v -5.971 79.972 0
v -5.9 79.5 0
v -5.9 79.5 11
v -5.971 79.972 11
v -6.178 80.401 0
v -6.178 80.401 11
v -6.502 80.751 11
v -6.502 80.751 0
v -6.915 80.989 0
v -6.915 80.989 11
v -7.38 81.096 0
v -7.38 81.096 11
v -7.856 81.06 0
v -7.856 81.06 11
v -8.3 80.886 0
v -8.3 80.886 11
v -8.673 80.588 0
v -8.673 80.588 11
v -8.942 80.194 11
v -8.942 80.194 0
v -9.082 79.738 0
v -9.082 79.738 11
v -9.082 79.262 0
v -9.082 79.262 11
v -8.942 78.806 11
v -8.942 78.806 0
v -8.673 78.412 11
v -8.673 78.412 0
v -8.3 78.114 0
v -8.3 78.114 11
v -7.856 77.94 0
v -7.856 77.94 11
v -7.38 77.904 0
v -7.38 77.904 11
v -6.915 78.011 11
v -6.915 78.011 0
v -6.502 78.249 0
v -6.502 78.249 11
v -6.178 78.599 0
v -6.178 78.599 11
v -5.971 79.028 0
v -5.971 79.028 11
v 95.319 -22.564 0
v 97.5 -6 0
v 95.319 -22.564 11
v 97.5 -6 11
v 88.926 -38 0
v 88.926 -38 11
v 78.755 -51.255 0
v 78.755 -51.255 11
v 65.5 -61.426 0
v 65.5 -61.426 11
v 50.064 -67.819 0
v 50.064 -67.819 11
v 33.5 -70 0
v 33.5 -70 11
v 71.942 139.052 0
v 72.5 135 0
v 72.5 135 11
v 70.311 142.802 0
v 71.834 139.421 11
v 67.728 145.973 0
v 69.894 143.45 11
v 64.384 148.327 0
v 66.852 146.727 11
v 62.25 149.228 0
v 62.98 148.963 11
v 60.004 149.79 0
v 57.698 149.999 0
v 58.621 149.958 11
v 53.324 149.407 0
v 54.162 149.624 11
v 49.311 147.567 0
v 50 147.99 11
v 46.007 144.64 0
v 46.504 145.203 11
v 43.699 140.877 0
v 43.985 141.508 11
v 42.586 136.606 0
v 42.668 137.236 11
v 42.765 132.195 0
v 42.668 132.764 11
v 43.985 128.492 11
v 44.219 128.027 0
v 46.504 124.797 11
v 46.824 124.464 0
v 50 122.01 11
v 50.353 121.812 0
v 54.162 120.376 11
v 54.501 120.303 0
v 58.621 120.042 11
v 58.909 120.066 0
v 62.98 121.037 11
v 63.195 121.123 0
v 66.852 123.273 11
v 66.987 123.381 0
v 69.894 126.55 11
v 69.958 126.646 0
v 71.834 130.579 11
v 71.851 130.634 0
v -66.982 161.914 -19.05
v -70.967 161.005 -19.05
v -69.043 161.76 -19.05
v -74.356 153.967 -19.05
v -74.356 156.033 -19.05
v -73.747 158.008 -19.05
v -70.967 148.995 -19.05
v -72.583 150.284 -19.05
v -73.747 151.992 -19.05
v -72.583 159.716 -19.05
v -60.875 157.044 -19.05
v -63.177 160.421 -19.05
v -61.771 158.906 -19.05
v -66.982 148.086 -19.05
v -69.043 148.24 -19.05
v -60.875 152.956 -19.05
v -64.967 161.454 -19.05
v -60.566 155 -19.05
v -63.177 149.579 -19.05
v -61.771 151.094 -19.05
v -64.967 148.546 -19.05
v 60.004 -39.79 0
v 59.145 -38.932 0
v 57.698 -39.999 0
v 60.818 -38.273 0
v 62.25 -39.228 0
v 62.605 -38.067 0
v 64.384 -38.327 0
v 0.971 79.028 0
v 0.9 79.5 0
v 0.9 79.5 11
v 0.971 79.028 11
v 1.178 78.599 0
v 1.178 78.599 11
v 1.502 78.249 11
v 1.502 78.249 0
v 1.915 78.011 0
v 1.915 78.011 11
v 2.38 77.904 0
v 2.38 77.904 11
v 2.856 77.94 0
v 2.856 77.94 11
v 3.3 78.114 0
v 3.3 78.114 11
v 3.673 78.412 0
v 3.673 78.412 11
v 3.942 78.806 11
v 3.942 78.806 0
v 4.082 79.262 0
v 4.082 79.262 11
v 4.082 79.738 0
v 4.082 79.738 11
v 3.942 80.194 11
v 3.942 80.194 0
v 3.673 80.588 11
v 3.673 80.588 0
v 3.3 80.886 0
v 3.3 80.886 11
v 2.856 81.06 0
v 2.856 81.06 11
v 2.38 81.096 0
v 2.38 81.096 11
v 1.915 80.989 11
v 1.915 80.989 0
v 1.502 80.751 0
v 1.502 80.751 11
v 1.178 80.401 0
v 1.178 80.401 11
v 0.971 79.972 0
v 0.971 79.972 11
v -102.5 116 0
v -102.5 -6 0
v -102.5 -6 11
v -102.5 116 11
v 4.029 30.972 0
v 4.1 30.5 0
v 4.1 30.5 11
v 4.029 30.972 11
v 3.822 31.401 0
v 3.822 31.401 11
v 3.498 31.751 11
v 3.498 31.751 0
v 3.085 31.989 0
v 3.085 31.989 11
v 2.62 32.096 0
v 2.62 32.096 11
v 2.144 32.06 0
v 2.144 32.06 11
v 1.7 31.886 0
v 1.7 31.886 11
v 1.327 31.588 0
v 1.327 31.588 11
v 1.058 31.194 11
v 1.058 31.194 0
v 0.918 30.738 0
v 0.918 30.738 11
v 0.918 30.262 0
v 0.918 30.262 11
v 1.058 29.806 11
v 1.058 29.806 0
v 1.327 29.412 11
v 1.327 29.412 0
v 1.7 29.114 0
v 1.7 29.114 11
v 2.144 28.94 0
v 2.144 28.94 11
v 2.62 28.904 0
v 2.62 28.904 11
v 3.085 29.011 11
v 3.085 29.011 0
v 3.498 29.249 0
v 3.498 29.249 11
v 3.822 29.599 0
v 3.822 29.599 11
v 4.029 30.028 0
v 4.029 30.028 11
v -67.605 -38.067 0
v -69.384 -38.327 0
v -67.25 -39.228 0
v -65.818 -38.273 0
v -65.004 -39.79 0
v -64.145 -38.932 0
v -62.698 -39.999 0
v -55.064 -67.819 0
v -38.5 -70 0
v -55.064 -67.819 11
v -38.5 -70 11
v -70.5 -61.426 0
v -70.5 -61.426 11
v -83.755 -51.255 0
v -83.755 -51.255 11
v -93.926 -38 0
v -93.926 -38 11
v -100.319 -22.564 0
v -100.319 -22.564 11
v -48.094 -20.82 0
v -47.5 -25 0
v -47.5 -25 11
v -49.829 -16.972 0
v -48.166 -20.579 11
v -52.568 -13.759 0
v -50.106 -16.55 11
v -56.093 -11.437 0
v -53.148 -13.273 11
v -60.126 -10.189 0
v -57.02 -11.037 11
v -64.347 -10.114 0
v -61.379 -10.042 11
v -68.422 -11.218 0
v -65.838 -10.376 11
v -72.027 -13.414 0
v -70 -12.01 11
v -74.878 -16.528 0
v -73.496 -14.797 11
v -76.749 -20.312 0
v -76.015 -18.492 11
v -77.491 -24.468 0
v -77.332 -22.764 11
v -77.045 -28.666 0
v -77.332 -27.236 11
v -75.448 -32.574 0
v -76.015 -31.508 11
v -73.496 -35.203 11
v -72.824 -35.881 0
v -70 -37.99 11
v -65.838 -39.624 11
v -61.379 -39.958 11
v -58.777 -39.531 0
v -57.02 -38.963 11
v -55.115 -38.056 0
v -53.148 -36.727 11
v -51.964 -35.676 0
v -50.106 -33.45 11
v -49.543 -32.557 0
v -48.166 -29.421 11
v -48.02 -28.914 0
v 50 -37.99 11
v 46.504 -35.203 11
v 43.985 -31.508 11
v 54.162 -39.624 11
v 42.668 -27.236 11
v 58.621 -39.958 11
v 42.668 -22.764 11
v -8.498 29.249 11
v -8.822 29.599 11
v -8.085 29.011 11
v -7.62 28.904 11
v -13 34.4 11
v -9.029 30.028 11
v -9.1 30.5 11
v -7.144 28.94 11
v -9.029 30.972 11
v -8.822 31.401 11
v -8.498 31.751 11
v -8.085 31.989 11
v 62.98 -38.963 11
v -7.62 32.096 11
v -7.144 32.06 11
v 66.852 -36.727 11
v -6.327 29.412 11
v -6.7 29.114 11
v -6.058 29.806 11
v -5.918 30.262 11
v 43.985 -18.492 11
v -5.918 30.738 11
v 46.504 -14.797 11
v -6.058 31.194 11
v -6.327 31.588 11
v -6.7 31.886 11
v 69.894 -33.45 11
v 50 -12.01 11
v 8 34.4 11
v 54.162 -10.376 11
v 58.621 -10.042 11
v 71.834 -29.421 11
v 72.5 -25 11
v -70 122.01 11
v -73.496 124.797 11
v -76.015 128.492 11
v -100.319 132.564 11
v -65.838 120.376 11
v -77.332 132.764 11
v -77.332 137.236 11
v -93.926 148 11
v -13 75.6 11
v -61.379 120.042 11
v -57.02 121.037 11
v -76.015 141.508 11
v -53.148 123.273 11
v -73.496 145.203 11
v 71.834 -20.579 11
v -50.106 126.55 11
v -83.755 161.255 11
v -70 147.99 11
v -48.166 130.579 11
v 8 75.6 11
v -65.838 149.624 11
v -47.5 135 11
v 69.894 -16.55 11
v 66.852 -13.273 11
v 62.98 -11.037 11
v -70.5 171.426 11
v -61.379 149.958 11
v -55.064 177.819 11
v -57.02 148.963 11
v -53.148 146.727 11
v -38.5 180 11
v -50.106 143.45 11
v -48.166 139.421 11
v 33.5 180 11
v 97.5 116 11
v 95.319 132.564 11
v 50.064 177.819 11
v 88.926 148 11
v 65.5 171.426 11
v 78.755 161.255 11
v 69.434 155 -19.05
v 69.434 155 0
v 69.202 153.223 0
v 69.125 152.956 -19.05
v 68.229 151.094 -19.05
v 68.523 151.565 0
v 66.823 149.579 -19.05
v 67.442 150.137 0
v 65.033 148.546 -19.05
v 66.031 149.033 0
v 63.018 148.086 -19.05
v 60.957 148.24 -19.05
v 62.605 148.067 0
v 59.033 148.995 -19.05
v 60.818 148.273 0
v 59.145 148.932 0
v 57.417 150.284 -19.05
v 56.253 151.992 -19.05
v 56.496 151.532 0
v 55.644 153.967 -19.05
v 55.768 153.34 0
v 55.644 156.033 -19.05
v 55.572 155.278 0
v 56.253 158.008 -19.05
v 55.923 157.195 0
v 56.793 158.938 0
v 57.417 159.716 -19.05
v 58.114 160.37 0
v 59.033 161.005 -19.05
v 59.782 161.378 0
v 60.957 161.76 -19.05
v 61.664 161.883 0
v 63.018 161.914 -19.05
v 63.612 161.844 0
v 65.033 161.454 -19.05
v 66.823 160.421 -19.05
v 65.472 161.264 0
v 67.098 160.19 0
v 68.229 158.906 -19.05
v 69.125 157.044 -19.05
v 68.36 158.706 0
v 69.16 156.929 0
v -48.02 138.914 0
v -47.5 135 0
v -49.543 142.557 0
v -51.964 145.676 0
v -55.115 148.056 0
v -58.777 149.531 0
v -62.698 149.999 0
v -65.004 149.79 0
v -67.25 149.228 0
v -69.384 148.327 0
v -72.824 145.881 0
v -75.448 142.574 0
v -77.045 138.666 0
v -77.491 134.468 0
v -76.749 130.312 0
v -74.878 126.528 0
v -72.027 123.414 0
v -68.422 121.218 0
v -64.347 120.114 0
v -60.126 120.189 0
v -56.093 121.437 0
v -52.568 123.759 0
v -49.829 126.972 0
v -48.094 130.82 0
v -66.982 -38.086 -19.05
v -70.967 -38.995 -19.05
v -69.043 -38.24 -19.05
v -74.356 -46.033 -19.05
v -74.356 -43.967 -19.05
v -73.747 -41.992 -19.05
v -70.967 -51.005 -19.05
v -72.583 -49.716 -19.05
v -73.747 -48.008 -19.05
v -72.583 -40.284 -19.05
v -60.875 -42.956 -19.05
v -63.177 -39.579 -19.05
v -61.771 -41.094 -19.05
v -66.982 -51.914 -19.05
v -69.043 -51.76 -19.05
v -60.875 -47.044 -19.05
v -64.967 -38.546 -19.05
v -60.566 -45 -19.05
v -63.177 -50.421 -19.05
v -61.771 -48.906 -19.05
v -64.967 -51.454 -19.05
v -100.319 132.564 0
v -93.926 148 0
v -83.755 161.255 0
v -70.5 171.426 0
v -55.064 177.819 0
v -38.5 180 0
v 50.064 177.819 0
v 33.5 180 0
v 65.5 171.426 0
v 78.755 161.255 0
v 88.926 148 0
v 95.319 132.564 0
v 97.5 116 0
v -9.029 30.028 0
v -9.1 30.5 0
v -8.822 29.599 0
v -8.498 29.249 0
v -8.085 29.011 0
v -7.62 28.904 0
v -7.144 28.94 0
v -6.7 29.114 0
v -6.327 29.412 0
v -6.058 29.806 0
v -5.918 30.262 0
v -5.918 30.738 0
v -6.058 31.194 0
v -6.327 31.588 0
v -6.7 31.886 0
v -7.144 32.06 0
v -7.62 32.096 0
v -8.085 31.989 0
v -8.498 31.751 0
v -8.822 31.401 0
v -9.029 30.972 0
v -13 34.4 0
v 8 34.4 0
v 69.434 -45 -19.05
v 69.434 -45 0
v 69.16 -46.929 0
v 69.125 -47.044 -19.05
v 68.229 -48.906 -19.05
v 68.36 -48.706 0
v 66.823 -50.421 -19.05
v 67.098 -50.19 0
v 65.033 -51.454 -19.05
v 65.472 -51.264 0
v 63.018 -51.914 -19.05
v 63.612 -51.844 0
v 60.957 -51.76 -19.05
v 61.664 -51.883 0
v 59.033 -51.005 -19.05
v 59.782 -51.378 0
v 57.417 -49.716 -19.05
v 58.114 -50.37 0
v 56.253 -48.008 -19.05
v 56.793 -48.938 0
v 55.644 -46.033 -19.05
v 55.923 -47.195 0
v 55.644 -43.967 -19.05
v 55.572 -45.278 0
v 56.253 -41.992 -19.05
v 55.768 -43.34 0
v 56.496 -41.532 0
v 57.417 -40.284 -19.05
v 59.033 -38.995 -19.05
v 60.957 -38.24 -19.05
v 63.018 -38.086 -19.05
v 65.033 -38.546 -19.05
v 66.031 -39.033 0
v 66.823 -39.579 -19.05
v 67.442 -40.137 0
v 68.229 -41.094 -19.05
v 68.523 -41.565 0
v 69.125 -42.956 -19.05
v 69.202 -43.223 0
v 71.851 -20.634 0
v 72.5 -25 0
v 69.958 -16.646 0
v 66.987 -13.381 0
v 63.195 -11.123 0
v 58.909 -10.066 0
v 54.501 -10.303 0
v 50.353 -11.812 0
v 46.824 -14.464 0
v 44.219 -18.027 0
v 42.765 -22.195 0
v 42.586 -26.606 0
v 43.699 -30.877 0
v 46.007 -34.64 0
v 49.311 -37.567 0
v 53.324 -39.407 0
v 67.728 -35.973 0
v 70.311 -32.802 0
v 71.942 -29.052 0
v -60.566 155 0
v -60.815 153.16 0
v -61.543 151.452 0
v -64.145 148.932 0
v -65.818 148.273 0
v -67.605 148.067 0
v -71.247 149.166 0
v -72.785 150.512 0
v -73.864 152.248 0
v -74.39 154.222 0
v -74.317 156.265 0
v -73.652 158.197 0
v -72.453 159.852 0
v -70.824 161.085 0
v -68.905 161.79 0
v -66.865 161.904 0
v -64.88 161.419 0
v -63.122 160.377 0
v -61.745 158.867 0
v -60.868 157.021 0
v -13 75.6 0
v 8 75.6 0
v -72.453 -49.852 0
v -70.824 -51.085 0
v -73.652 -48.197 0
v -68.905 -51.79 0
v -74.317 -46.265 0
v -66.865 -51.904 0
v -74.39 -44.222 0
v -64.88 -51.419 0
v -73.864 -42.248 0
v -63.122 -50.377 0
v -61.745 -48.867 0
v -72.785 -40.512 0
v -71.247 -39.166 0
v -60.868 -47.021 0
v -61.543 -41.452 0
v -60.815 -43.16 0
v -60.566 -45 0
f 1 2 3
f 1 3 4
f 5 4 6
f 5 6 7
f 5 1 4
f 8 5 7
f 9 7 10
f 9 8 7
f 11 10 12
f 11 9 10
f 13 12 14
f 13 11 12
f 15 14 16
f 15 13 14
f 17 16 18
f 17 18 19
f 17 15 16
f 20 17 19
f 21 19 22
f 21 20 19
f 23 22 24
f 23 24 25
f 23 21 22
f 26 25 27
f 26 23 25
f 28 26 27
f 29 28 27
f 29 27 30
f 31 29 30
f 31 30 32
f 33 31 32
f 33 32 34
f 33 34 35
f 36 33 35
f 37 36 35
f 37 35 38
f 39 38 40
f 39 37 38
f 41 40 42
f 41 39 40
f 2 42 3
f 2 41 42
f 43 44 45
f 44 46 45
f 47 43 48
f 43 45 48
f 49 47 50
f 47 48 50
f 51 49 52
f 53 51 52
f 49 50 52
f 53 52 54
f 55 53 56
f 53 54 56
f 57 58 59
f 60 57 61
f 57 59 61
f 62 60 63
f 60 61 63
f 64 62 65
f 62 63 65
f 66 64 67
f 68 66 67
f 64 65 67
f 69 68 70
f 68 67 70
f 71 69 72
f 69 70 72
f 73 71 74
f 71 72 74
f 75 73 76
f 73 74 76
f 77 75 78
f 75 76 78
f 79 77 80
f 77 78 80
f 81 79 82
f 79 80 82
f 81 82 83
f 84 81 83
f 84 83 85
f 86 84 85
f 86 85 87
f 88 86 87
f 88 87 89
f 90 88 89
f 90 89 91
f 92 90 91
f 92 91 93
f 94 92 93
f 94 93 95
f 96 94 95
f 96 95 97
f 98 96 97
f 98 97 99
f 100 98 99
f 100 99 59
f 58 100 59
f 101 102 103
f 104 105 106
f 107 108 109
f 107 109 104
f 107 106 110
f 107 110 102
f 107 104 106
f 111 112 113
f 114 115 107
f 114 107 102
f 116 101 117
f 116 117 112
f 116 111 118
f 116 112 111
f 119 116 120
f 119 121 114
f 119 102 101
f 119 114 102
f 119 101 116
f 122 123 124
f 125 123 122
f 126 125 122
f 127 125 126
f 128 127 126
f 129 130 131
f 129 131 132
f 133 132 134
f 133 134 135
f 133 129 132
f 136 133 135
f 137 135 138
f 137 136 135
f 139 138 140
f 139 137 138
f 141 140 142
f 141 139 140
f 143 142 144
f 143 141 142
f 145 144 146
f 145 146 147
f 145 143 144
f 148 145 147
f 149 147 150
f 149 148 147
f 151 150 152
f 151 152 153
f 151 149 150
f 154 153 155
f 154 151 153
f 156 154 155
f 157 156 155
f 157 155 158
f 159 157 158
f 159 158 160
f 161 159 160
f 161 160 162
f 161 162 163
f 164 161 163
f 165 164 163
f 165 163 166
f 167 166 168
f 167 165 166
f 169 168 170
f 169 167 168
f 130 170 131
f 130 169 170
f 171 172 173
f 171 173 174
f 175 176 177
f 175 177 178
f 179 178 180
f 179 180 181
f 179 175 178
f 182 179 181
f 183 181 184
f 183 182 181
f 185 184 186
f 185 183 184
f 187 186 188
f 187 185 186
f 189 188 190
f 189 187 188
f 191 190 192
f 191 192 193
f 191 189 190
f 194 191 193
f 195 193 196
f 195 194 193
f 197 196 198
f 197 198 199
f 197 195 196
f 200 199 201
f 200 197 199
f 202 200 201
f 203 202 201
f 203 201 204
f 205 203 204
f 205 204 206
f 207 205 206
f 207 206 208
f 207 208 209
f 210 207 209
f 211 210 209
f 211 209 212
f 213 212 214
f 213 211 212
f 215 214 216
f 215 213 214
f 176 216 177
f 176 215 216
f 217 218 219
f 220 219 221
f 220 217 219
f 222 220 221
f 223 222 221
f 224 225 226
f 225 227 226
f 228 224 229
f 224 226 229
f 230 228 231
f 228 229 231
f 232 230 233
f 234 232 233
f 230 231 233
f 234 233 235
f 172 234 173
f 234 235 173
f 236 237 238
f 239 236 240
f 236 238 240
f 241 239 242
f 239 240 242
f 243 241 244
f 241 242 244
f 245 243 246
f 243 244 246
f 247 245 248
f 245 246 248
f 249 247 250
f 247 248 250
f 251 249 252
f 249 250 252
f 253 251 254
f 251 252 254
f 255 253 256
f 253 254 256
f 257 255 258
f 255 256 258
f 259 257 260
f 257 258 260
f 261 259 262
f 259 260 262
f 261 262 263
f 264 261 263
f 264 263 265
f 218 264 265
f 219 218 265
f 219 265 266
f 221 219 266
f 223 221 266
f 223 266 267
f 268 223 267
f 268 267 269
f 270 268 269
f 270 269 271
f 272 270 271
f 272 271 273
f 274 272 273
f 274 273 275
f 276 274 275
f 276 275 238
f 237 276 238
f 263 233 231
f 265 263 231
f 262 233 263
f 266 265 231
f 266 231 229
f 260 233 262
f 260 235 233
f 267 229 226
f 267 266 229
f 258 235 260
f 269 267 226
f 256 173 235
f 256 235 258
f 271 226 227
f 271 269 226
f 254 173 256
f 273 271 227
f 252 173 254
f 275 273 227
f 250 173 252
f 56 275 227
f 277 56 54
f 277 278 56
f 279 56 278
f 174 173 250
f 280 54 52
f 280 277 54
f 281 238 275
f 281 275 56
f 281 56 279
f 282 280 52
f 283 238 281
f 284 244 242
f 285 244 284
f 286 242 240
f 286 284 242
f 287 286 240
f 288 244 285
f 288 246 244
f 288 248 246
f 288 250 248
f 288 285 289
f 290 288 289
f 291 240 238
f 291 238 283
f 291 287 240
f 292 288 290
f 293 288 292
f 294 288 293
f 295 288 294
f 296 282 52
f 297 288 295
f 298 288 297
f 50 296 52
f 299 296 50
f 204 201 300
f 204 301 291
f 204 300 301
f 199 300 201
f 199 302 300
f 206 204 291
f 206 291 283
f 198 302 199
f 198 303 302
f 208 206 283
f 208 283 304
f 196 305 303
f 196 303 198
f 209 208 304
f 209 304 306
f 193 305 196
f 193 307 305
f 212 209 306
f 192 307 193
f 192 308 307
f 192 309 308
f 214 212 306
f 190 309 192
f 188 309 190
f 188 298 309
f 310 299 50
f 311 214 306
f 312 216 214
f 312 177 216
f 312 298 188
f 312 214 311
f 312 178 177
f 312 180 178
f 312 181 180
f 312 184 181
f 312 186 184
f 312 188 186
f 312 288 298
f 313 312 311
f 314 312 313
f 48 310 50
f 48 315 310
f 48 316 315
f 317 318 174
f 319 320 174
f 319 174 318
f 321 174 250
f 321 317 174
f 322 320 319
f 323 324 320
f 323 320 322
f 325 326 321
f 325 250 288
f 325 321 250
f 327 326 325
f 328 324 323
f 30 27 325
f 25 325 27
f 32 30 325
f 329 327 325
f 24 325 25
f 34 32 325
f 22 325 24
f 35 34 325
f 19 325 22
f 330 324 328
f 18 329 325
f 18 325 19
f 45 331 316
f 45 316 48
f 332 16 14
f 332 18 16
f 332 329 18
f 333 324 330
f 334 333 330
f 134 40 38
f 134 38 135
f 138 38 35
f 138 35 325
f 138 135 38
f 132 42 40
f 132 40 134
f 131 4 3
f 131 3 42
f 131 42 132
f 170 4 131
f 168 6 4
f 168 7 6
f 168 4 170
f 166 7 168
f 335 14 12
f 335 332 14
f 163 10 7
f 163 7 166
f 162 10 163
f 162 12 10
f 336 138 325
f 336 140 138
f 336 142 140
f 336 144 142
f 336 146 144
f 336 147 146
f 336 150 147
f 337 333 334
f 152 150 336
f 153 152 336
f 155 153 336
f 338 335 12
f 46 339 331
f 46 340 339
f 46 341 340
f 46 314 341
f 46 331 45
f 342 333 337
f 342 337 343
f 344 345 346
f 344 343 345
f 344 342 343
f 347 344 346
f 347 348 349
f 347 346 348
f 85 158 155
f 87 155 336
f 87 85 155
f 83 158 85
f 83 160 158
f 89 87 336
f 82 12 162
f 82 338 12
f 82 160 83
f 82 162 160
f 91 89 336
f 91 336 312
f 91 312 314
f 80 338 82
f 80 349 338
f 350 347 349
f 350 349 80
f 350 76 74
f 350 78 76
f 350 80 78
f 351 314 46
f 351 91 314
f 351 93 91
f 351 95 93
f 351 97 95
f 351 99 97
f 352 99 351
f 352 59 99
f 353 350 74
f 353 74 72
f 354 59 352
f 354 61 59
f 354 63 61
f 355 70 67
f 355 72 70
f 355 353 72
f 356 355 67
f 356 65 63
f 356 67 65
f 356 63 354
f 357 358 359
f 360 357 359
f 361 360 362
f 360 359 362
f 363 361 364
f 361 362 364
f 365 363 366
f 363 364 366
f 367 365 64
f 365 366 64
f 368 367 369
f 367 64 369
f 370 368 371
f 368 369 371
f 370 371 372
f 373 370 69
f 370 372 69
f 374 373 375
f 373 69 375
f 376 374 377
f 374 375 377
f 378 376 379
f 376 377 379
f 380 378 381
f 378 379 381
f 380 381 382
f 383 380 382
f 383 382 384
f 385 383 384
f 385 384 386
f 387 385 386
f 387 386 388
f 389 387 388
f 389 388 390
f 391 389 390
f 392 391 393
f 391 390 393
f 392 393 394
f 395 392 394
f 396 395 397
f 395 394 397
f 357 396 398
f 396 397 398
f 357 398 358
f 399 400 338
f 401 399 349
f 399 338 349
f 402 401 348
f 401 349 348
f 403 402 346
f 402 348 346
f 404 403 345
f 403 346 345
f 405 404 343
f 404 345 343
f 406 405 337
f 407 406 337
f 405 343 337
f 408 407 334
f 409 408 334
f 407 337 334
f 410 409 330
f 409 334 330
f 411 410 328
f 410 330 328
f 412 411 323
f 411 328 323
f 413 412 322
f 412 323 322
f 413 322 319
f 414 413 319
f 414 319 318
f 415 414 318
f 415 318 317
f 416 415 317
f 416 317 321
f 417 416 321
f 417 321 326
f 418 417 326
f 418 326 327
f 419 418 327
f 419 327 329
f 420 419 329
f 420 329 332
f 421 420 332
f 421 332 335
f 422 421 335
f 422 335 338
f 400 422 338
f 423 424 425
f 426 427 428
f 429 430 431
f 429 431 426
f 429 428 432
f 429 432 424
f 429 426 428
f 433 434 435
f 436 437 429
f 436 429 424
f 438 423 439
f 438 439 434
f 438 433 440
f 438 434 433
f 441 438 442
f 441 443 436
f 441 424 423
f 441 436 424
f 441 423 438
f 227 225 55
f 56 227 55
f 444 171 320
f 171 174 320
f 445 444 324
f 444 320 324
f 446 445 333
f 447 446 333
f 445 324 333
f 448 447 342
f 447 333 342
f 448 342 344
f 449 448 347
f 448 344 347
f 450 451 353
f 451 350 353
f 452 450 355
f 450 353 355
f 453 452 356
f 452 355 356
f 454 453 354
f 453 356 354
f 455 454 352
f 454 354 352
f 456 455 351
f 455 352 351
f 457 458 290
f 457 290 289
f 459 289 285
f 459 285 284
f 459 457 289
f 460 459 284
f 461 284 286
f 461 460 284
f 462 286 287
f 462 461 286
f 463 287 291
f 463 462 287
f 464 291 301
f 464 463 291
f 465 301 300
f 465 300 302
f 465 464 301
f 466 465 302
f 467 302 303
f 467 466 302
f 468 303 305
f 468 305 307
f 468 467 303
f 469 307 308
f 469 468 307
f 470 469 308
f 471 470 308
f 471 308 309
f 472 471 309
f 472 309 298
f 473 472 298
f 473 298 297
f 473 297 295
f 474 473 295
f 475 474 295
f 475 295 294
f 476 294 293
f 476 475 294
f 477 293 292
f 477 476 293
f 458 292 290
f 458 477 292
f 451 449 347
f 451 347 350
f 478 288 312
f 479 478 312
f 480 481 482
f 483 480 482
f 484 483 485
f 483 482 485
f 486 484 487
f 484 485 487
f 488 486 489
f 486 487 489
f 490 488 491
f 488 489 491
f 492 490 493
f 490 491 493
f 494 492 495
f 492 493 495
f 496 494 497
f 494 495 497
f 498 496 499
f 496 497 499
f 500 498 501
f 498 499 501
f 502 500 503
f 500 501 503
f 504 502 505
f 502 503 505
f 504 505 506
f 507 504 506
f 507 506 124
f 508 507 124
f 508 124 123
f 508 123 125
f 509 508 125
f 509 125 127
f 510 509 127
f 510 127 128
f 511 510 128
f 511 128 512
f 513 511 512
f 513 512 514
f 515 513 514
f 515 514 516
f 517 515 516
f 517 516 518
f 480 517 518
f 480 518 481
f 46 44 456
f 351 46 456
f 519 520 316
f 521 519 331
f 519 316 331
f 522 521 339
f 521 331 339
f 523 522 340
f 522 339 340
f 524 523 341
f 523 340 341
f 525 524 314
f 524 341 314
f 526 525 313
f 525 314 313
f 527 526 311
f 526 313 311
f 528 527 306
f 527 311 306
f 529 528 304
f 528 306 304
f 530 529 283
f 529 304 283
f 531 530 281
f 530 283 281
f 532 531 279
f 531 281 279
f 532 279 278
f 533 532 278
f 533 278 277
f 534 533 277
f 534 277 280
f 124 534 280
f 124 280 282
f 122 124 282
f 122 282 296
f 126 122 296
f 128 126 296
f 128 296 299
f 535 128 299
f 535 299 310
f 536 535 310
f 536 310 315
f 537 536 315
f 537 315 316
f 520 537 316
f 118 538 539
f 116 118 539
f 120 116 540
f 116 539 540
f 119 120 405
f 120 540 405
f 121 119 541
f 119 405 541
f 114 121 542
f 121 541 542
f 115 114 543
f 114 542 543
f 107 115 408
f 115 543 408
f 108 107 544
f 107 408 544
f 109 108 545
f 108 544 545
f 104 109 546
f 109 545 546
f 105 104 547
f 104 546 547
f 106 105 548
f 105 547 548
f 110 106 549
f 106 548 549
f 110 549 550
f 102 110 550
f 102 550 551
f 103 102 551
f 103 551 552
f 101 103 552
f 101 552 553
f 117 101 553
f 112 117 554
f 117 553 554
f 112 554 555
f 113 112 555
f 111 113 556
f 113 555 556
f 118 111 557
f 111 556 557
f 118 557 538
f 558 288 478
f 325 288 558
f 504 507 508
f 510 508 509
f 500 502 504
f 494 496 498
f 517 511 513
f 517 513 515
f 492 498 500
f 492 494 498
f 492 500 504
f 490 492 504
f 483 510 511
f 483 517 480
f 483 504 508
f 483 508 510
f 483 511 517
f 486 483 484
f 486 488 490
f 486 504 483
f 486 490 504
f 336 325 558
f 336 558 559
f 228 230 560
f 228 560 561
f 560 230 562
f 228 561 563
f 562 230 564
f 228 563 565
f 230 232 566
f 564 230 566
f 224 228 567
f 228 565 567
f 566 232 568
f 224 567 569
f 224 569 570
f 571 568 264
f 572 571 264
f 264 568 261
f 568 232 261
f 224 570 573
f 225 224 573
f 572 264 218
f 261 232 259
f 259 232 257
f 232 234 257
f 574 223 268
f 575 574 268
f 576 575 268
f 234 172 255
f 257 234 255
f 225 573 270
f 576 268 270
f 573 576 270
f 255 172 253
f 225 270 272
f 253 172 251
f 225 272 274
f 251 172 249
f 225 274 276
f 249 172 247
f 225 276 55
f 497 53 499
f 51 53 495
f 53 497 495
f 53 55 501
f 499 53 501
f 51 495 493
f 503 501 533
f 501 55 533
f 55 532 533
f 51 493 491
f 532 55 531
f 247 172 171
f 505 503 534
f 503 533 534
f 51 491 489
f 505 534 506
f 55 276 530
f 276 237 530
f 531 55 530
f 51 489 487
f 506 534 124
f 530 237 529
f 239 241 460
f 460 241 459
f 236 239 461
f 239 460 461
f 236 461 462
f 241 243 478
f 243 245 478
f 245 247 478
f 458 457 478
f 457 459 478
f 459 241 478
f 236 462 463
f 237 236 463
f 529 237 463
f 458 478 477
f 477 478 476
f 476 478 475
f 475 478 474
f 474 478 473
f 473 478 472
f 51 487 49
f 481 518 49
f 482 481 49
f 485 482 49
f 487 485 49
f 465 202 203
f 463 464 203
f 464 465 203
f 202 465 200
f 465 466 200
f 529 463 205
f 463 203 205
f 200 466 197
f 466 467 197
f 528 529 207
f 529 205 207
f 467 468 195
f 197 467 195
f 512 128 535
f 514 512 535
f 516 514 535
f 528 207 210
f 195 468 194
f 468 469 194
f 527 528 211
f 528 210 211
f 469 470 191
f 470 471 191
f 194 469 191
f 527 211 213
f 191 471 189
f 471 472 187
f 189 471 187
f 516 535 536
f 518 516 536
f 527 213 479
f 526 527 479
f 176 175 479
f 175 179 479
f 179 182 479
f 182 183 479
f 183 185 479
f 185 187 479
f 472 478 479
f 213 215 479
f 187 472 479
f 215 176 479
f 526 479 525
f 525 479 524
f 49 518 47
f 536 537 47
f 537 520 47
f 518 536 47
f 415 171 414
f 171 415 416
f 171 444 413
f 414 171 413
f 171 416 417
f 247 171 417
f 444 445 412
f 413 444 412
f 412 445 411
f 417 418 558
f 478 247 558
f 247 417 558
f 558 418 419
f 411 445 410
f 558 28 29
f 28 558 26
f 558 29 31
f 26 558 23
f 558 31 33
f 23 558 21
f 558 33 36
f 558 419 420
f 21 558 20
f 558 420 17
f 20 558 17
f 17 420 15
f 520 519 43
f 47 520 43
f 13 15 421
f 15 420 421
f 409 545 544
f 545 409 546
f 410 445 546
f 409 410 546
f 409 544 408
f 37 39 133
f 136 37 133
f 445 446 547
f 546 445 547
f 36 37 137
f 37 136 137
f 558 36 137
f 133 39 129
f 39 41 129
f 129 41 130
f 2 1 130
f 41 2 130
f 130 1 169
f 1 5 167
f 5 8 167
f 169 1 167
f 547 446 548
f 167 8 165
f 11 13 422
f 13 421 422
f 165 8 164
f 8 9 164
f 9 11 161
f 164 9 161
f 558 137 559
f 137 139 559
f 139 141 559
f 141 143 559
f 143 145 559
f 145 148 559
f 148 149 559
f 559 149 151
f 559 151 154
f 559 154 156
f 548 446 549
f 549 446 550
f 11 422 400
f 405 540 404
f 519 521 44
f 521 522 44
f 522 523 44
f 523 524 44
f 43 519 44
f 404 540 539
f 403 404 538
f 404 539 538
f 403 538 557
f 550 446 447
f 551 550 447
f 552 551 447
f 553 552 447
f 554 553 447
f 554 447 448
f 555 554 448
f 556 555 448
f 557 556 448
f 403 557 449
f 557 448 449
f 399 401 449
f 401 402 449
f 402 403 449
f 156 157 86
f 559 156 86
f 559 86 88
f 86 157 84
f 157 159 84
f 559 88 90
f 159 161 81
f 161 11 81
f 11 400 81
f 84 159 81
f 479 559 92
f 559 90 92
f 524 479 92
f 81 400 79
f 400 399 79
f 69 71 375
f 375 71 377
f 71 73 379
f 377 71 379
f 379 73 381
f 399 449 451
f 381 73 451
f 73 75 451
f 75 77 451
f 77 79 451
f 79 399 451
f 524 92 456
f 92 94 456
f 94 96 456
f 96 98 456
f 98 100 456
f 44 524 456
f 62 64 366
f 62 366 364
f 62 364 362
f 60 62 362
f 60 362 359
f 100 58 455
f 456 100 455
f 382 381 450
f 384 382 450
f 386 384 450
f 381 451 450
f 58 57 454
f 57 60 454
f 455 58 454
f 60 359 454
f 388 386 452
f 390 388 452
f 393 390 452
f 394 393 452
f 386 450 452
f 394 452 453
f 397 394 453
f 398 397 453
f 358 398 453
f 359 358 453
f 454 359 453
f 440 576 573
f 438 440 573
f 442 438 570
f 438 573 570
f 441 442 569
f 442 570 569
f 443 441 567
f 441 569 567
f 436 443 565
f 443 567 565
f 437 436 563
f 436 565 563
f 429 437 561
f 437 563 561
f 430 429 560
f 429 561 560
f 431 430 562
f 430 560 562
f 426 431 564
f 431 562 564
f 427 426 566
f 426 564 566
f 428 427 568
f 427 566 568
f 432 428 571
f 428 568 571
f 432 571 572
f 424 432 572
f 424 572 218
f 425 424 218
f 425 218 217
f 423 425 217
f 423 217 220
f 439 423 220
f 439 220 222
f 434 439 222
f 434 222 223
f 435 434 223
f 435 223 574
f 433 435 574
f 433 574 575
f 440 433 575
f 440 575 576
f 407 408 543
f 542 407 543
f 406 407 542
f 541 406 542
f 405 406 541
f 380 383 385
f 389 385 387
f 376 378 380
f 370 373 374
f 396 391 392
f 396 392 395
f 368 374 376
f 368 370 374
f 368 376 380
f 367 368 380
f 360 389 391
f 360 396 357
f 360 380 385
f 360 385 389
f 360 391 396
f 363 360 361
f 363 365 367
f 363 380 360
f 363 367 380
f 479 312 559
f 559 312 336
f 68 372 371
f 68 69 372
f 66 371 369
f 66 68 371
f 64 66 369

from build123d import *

# Parameters (mm, degrees)
SKETCH1_R           = 1.6
SKETCH1_W           = 21
SKETCH1_H           = 41
BOSS_EXTRUDE1_DEPTH = 11
SKETCH6_W           = 21
SKETCH6_H           = 0.1
CUT_EXTRUDE1_DEPTH  = 91.428148273
SKETCH7_W           = 21
SKETCH7_H           = 41.2
SKETCH7_R           = 1.6
CUT_EXTRUDE2_DEPTH  = 11
BOSS_EXTRUDE2_START = -11
SKETCH8_W           = 200
SKETCH8_H           = 250
SKETCH8_W_2         = 21
SKETCH8_H_2         = 41.2
SKETCH8_R           = 1.6
BOSS_EXTRUDE2_DEPTH = 11
FILLET1_R           = 64
FILLET2_R           = 64
FILLET3_R           = 64
FILLET4_R           = 64
SKETCH12_R          = 6.933523759
BOSS_EXTRUDE3_DEPTH = 19.05
SKETCH13_R          = 15
CUT_EXTRUDE3_DEPTH  = 11


with BuildPart() as part:
    # Sketch1 → Boss-Extrude1 (new body)
    with BuildSketch(Plane.XY):
        with BuildLine():
            Line((-20, 70), (-20, -50))
            ThreePointArc((-20, -50), (-2.5, -67.5), (15, -50))
            Line((15, -50), (15, 70))
            ThreePointArc((15, 70), (-2.5, 87.5), (-20, 70))
        make_face()
        with Locations((-7.5, 79.5)):
            Circle(SKETCH1_R, mode=Mode.SUBTRACT)
        with Locations(Location((2.5, 79.5, 0), (0, 0, 180))):
            Circle(SKETCH1_R, mode=Mode.SUBTRACT)
        with Locations((2.5, 30.5)):
            Circle(SKETCH1_R, mode=Mode.SUBTRACT)
        with Locations(Location((-7.5, 30.5, 0), (0, 0, 180))):
            Circle(SKETCH1_R, mode=Mode.SUBTRACT)
        with Locations((-2.5, 55)):
            Rectangle(SKETCH1_W, SKETCH1_H, mode=Mode.SUBTRACT)
    extrude(amount=BOSS_EXTRUDE1_DEPTH)

    # Sketch6 → Cut-Extrude1 (cut, through all)
    with BuildSketch(Plane.XY.offset(11)):
        with Locations((-2.5, 75.55)):
            Rectangle(SKETCH6_W, SKETCH6_H)
        with Locations((-2.5, 34.45)):
            Rectangle(SKETCH6_W, SKETCH6_H)
    extrude(amount=-CUT_EXTRUDE1_DEPTH, mode=Mode.SUBTRACT)

    # Sketch7 → Cut-Extrude2 (cut)
    with BuildSketch(Plane(origin=(0, 0, 0), x_dir=(-1, 0, 0), z_dir=(0, 0, -1))):
        with Locations((2.5, -35)):
            Rectangle(SKETCH7_W, SKETCH7_H)
        with Locations((-2.5, -10.5)):
            Circle(SKETCH7_R)
        with Locations((7.5, -10.5)):
            Circle(SKETCH7_R)
        with Locations((-2.5, -59.5)):
            Circle(SKETCH7_R)
        with Locations((7.5, -59.5)):
            Circle(SKETCH7_R)
    extrude(amount=-CUT_EXTRUDE2_DEPTH, mode=Mode.SUBTRACT)

    # Sketch8 → Boss-Extrude2 (add)
    # profile 1 of 6: a face of its own
    with BuildSketch(Plane.XY.offset(11).offset(BOSS_EXTRUDE2_START)):
        with Locations((-2.5, 55)):
            Rectangle(SKETCH8_W, SKETCH8_H)
        with BuildLine():
            ThreePointArc((-20, -50), (-2.5, -67.5), (15, -50))
            Line((15, -50), (15, 70))
            ThreePointArc((15, 70), (-2.5, 87.5), (-20, 70))
            Line((-20, 70), (-20, -50))
        make_face(mode=Mode.SUBTRACT)
    # profile 2 of 6: a face of its own
    with BuildSketch(Plane.XY.offset(11).offset(BOSS_EXTRUDE2_START)):
        with Locations((-2.5, -35)):
            Rectangle(SKETCH8_W_2, SKETCH8_H_2)
    # profile 3 of 6: a face of its own
    with BuildSketch(Plane.XY.offset(11).offset(BOSS_EXTRUDE2_START)):
        with Locations((-7.5, -59.5)):
            Circle(SKETCH8_R)
    # profile 4 of 6: a face of its own
    with BuildSketch(Plane.XY.offset(11).offset(BOSS_EXTRUDE2_START)):
        with Locations((2.5, -59.5)):
            Circle(SKETCH8_R)
    # profile 5 of 6: a face of its own
    with BuildSketch(Plane.XY.offset(11).offset(BOSS_EXTRUDE2_START)):
        with Locations((-7.5, -10.5)):
            Circle(SKETCH8_R)
    # profile 6 of 6: a face of its own
    with BuildSketch(Plane.XY.offset(11).offset(BOSS_EXTRUDE2_START)):
        with Locations((2.5, -10.5)):
            Circle(SKETCH8_R)
    extrude(amount=BOSS_EXTRUDE2_DEPTH)

    # Fillet1
    fillet1_edges = [part.edges().sort_by_distance(p)[0] for p in [
        (-102.5, 180, 5.5),
    ]]
    fillet(fillet1_edges, radius=FILLET1_R)

    # Fillet2
    fillet2_edges = [part.edges().sort_by_distance(p)[0] for p in [
        (97.5, 180, 5.5),
    ]]
    fillet(fillet2_edges, radius=FILLET2_R)

    # Fillet3
    fillet3_edges = [part.edges().sort_by_distance(p)[0] for p in [
        (97.5, -70, 5.5),
    ]]
    fillet(fillet3_edges, radius=FILLET3_R)

    # Fillet4
    fillet4_edges = [part.edges().sort_by_distance(p)[0] for p in [
        (-102.5, -70, 5.5),
    ]]
    fillet(fillet4_edges, radius=FILLET4_R)

    # Sketch12 → Boss-Extrude3 (add)
    with BuildSketch(Plane(origin=(0, 0, 0), x_dir=(-1, 0, 0), z_dir=(0, 0, -1))):
        with Locations(Location((67.5, 155, 0), (0, 0, 180))):
            Circle(SKETCH12_R)
        with Locations(Location((-62.5, -45, 0), (0, 0, 180))):
            Circle(SKETCH12_R)
        with Locations(Location((67.5, -45, 0), (0, 0, 180))):
            Circle(SKETCH12_R)
        with Locations(Location((-62.5, 155, 0), (0, 0, 180))):
            Circle(SKETCH12_R)
    extrude(amount=BOSS_EXTRUDE3_DEPTH)

    # Sketch13 → Cut-Extrude3 (cut)
    with BuildSketch(Plane.XY.offset(11)):
        with Locations((-62.5, 135)):
            Circle(SKETCH13_R)
        with Locations((57.5, 135)):
            Circle(SKETCH13_R)
        with Locations((57.5, -25)):
            Circle(SKETCH13_R)
        with Locations((-62.5, -25)):
            Circle(SKETCH13_R)
    extrude(amount=-CUT_EXTRUDE3_DEPTH, mode=Mode.SUBTRACT)


solid = part.part
